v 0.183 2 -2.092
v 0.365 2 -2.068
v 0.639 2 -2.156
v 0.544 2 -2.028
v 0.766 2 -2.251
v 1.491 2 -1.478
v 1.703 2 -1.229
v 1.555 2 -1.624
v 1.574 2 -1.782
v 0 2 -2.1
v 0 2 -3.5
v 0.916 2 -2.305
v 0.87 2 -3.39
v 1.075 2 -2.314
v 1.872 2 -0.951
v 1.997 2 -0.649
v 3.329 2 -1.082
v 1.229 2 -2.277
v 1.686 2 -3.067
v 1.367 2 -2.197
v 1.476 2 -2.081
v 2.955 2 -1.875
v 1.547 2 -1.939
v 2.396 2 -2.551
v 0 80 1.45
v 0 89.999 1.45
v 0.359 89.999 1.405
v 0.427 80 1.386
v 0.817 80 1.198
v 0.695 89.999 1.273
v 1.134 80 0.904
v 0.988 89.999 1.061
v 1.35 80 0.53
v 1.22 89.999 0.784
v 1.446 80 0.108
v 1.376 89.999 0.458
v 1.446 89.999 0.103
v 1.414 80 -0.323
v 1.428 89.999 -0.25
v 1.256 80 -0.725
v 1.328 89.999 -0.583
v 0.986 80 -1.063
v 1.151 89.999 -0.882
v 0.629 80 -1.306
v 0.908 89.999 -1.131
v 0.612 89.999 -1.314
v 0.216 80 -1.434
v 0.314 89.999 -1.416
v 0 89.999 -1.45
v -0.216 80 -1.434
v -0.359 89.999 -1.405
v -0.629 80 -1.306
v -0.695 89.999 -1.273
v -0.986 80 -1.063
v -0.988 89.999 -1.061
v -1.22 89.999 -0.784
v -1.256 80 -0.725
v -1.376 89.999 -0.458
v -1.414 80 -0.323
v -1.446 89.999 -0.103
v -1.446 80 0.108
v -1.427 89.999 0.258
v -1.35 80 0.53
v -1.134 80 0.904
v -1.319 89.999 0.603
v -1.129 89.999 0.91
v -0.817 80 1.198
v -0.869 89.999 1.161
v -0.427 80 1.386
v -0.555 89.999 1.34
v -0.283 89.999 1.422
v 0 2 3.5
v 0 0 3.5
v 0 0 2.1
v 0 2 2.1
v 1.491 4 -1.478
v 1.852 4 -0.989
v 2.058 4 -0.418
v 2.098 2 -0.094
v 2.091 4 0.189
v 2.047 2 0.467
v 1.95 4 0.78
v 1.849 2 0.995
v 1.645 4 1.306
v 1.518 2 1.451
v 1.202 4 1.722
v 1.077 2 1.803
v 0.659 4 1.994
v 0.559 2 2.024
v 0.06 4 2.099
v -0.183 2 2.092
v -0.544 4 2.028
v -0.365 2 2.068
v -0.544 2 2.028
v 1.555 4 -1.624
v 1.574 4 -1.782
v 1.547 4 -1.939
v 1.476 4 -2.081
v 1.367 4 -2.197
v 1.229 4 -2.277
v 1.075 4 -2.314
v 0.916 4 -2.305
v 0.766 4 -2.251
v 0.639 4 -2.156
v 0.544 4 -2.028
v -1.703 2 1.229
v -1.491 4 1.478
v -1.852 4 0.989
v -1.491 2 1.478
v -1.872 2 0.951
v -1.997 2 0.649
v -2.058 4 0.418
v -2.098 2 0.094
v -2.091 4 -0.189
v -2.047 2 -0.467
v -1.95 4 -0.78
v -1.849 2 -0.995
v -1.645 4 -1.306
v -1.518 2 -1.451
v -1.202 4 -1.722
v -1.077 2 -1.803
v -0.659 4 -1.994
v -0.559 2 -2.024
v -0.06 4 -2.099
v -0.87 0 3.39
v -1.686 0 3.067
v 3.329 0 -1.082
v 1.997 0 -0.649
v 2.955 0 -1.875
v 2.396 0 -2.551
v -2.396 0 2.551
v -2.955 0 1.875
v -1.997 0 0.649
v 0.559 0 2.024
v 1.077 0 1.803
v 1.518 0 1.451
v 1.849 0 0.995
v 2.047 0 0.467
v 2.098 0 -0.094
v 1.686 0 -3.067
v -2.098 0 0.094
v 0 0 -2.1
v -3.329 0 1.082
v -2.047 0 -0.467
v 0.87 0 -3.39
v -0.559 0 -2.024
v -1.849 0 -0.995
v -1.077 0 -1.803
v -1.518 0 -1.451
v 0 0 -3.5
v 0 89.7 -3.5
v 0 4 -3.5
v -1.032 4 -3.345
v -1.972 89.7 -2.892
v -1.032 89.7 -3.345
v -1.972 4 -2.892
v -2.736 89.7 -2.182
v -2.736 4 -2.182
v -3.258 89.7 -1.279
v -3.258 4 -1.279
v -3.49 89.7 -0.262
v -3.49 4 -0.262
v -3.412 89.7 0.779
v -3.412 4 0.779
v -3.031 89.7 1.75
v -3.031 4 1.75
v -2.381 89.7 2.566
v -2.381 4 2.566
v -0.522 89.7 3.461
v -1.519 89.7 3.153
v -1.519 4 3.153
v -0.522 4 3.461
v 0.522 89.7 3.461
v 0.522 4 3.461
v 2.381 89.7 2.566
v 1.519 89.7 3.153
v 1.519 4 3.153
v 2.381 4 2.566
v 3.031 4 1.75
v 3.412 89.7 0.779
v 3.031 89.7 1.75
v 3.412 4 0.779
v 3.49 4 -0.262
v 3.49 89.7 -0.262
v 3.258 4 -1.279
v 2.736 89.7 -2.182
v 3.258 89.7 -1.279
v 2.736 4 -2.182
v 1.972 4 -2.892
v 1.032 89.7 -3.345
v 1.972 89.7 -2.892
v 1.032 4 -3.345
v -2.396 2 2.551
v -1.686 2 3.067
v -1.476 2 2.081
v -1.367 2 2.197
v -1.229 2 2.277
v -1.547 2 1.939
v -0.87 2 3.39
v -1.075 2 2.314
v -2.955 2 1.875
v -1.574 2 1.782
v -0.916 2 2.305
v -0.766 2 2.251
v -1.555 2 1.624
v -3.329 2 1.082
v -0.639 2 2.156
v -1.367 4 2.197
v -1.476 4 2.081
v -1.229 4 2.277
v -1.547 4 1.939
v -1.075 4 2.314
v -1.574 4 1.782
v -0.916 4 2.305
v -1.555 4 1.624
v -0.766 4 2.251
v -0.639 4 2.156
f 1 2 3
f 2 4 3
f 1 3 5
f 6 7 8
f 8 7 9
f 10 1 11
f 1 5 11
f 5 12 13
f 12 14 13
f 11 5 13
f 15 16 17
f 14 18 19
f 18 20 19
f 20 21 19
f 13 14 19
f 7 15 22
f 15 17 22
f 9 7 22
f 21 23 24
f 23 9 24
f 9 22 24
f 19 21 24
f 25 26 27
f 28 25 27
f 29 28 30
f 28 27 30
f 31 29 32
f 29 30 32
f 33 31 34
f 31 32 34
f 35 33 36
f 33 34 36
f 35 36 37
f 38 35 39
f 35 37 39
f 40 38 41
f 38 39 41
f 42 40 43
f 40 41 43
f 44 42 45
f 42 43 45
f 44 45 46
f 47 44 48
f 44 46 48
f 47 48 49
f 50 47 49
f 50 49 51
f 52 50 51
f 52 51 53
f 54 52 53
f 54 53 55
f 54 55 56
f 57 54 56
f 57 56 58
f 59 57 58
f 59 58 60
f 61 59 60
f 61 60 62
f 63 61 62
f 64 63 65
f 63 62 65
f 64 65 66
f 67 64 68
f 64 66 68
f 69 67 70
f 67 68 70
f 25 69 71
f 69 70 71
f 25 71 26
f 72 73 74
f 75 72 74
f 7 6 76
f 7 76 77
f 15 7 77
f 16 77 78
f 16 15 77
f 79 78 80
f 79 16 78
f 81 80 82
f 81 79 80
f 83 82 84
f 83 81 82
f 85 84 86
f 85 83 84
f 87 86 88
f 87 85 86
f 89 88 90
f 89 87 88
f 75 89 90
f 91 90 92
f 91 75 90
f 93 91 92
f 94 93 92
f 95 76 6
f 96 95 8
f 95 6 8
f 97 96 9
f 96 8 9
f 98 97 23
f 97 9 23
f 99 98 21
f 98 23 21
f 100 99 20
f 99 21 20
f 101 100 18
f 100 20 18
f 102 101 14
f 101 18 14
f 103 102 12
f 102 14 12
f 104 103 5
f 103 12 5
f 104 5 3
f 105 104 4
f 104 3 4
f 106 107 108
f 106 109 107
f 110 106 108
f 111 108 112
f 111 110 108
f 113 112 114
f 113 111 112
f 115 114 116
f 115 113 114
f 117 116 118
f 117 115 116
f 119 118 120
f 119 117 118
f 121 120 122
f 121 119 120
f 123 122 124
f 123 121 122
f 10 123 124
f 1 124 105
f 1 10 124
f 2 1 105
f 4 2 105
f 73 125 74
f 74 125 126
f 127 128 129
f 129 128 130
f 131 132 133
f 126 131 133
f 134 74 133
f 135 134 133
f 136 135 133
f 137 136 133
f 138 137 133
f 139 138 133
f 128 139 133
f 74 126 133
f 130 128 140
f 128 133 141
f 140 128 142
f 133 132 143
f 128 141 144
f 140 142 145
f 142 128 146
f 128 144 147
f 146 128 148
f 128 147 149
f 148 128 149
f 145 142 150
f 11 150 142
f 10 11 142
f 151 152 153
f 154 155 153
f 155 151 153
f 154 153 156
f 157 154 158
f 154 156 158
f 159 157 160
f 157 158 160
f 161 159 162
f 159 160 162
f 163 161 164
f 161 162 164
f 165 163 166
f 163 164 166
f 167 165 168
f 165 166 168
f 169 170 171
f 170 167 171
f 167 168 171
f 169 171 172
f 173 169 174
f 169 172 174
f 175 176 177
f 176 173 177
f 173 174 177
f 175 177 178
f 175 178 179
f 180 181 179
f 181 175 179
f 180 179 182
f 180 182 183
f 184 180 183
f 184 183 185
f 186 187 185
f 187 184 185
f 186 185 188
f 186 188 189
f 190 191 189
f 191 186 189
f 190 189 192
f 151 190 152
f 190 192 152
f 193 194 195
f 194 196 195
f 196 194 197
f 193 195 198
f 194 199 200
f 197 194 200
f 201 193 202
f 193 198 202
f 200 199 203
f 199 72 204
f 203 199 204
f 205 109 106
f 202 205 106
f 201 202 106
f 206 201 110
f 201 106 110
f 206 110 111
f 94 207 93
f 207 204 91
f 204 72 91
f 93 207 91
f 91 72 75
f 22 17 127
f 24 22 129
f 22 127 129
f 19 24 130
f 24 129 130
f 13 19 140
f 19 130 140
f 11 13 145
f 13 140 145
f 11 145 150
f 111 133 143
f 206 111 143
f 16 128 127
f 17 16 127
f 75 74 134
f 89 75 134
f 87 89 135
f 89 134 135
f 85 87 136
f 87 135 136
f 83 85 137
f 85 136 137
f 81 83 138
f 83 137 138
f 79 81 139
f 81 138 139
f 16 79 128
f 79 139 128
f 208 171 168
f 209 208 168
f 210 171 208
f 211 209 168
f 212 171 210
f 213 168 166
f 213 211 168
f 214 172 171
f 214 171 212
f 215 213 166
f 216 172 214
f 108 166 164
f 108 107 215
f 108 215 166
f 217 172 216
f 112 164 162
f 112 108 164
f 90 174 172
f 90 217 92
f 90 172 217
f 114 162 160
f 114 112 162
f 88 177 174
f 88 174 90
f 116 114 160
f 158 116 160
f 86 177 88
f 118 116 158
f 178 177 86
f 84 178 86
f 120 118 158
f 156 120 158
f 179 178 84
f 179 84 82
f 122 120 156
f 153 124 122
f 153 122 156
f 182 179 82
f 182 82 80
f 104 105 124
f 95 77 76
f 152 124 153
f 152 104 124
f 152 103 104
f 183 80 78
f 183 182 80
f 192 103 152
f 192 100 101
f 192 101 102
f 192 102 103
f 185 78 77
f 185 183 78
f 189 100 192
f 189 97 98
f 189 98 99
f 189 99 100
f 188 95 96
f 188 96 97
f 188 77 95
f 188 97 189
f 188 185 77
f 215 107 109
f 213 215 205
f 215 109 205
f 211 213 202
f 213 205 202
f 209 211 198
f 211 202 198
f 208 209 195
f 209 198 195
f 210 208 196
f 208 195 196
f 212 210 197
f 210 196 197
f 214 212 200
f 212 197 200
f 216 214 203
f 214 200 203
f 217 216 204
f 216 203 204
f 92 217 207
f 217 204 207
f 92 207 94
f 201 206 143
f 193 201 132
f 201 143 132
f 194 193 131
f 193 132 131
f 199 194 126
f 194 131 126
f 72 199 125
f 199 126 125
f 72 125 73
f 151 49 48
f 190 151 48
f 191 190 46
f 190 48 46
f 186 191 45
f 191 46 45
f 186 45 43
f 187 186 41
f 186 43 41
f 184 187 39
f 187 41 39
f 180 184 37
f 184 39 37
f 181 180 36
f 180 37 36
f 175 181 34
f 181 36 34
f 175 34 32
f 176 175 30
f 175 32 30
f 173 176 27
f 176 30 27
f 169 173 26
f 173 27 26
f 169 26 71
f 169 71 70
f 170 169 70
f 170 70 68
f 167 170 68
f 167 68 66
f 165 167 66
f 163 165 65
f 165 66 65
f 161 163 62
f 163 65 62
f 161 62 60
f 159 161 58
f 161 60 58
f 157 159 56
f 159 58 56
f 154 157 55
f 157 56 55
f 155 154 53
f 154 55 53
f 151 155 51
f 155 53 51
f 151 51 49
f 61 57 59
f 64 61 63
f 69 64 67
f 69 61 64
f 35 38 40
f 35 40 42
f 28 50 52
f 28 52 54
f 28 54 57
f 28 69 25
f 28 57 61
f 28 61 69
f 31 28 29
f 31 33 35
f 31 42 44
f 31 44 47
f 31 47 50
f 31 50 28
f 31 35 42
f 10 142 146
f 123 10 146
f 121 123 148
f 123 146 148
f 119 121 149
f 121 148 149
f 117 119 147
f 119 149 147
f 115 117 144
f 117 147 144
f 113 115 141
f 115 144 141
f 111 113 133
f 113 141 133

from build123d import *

# Parameters (mm, degrees)
SKETCH_1_R          = 3.5
EXTRUDE_1_DEPTH     = 90
CUT_EXTRUDE_1_DEPTH = 2
SKETCH_3_R          = 3.5
SKETCH_3_R_2        = 2.1
CUT_EXTRUDE_3_DEPTH = 2
SKETCH_4_R          = 0.548210007
EXTRUDE_2_DEPTH     = 2
SKETCH_5_R          = 1.45
CUT_EXTRUDE_5_DEPTH = 10


with BuildPart() as part:
    # 草图1 → 凸台-拉伸1 (new body)
    with BuildSketch(Plane(origin=(0, 0, 0), x_dir=(1, 0, 0), z_dir=(0, 1, 0))):
        with Locations(Location((0, 0, 0), (0, 0, 90))):
            Circle(SKETCH_1_R)
    extrude(amount=EXTRUDE_1_DEPTH)

    # 草图2 → 切除-拉伸1 (cut)
    with BuildSketch(Plane.XZ):
        with BuildLine():
            Line((0, 3.5), (0, 2.1))
            ThreePointArc((0, 2.1), (1.698935688, 1.23434903), (1.997218684, -0.648935688))
            Line((1.997218684, -0.648935688), (3.328697807, -1.08155948))
            ThreePointArc((3.328697807, -1.08155948), (3.456909192, -0.547520628), (3.5, 0))
            ThreePointArc((3.5, 0), (2.474873734, 2.474873734), (0, 3.5))
        make_face()
        with BuildLine():
            ThreePointArc((0, -2.1), (-1.698935688, -1.23434903), (-1.997218684, 0.648935688))
            Line((-1.997218684, 0.648935688), (-3.328697807, 1.08155948))
            ThreePointArc((-3.328697807, 1.08155948), (-2.83155948, -2.057248383), (0, -3.5))
            Line((0, -3.5), (0, -2.1))
        make_face()
    extrude(amount=-CUT_EXTRUDE_1_DEPTH, mode=Mode.SUBTRACT)

    # 草图3 → 切除-拉伸3 (cut)
    with BuildSketch(Plane.XZ.offset(-2)):
        with Locations(Location((0, 0, 0), (0, 0, 270))):
            Circle(SKETCH_3_R)
        with Locations(Location((0, 0, 0), (0, 0, 270))):
            Circle(SKETCH_3_R_2, mode=Mode.SUBTRACT)
    extrude(amount=-CUT_EXTRUDE_3_DEPTH, mode=Mode.SUBTRACT)

    # 草图4 → 凸台-拉伸2 (add)
    with BuildSketch(Plane(origin=(0, 2, 0), x_dir=(1, 0, 0), z_dir=(0, 1, 0))):
        with Locations((-1.025992333, -1.768146991)):
            Circle(SKETCH_4_R)
        with Locations((1.025992333, 1.768146991)):
            Circle(SKETCH_4_R)
    extrude(amount=EXTRUDE_2_DEPTH)

    # 草图5 → 切除-拉伸5 (cut)
    with BuildSketch(Plane(origin=(0, 90, 0), x_dir=(1, 0, 0), z_dir=(0, 1, 0))):
        with Locations(Location((0, 0, 0), (0, 0, 270))):
            Circle(SKETCH_5_R)
    extrude(amount=-CUT_EXTRUDE_5_DEPTH, mode=Mode.SUBTRACT)

    # 草图6 → 切除-旋转2 (revolve, cut)
    with BuildSketch(Plane.XY, mode=Mode.PRIVATE) as cut_revolve_2_sk:
        with BuildLine():
            Line((3.5, 90), (3.5, 89.7))
            add(Edge.make_bspline(
                [(3.5, 89.7), (2.810594715, 89.888843462), (2.108922974, 89.988601578), (1.395404454, 90)],
                knots=[0, 0, 0, 0, 0.917895011, 0.917895011, 0.917895011, 0.917895011], degree=3))
            Line((1.395404454, 90), (3.5, 90))
        make_face()
    revolve(cut_revolve_2_sk.sketch.rotate(Axis((0, 107.628853611, 0), (0, -1, 0)), 270), axis=Axis((0, 107.628853611, 0), (0, -1, 0)), mode=Mode.SUBTRACT)


solid = part.part
